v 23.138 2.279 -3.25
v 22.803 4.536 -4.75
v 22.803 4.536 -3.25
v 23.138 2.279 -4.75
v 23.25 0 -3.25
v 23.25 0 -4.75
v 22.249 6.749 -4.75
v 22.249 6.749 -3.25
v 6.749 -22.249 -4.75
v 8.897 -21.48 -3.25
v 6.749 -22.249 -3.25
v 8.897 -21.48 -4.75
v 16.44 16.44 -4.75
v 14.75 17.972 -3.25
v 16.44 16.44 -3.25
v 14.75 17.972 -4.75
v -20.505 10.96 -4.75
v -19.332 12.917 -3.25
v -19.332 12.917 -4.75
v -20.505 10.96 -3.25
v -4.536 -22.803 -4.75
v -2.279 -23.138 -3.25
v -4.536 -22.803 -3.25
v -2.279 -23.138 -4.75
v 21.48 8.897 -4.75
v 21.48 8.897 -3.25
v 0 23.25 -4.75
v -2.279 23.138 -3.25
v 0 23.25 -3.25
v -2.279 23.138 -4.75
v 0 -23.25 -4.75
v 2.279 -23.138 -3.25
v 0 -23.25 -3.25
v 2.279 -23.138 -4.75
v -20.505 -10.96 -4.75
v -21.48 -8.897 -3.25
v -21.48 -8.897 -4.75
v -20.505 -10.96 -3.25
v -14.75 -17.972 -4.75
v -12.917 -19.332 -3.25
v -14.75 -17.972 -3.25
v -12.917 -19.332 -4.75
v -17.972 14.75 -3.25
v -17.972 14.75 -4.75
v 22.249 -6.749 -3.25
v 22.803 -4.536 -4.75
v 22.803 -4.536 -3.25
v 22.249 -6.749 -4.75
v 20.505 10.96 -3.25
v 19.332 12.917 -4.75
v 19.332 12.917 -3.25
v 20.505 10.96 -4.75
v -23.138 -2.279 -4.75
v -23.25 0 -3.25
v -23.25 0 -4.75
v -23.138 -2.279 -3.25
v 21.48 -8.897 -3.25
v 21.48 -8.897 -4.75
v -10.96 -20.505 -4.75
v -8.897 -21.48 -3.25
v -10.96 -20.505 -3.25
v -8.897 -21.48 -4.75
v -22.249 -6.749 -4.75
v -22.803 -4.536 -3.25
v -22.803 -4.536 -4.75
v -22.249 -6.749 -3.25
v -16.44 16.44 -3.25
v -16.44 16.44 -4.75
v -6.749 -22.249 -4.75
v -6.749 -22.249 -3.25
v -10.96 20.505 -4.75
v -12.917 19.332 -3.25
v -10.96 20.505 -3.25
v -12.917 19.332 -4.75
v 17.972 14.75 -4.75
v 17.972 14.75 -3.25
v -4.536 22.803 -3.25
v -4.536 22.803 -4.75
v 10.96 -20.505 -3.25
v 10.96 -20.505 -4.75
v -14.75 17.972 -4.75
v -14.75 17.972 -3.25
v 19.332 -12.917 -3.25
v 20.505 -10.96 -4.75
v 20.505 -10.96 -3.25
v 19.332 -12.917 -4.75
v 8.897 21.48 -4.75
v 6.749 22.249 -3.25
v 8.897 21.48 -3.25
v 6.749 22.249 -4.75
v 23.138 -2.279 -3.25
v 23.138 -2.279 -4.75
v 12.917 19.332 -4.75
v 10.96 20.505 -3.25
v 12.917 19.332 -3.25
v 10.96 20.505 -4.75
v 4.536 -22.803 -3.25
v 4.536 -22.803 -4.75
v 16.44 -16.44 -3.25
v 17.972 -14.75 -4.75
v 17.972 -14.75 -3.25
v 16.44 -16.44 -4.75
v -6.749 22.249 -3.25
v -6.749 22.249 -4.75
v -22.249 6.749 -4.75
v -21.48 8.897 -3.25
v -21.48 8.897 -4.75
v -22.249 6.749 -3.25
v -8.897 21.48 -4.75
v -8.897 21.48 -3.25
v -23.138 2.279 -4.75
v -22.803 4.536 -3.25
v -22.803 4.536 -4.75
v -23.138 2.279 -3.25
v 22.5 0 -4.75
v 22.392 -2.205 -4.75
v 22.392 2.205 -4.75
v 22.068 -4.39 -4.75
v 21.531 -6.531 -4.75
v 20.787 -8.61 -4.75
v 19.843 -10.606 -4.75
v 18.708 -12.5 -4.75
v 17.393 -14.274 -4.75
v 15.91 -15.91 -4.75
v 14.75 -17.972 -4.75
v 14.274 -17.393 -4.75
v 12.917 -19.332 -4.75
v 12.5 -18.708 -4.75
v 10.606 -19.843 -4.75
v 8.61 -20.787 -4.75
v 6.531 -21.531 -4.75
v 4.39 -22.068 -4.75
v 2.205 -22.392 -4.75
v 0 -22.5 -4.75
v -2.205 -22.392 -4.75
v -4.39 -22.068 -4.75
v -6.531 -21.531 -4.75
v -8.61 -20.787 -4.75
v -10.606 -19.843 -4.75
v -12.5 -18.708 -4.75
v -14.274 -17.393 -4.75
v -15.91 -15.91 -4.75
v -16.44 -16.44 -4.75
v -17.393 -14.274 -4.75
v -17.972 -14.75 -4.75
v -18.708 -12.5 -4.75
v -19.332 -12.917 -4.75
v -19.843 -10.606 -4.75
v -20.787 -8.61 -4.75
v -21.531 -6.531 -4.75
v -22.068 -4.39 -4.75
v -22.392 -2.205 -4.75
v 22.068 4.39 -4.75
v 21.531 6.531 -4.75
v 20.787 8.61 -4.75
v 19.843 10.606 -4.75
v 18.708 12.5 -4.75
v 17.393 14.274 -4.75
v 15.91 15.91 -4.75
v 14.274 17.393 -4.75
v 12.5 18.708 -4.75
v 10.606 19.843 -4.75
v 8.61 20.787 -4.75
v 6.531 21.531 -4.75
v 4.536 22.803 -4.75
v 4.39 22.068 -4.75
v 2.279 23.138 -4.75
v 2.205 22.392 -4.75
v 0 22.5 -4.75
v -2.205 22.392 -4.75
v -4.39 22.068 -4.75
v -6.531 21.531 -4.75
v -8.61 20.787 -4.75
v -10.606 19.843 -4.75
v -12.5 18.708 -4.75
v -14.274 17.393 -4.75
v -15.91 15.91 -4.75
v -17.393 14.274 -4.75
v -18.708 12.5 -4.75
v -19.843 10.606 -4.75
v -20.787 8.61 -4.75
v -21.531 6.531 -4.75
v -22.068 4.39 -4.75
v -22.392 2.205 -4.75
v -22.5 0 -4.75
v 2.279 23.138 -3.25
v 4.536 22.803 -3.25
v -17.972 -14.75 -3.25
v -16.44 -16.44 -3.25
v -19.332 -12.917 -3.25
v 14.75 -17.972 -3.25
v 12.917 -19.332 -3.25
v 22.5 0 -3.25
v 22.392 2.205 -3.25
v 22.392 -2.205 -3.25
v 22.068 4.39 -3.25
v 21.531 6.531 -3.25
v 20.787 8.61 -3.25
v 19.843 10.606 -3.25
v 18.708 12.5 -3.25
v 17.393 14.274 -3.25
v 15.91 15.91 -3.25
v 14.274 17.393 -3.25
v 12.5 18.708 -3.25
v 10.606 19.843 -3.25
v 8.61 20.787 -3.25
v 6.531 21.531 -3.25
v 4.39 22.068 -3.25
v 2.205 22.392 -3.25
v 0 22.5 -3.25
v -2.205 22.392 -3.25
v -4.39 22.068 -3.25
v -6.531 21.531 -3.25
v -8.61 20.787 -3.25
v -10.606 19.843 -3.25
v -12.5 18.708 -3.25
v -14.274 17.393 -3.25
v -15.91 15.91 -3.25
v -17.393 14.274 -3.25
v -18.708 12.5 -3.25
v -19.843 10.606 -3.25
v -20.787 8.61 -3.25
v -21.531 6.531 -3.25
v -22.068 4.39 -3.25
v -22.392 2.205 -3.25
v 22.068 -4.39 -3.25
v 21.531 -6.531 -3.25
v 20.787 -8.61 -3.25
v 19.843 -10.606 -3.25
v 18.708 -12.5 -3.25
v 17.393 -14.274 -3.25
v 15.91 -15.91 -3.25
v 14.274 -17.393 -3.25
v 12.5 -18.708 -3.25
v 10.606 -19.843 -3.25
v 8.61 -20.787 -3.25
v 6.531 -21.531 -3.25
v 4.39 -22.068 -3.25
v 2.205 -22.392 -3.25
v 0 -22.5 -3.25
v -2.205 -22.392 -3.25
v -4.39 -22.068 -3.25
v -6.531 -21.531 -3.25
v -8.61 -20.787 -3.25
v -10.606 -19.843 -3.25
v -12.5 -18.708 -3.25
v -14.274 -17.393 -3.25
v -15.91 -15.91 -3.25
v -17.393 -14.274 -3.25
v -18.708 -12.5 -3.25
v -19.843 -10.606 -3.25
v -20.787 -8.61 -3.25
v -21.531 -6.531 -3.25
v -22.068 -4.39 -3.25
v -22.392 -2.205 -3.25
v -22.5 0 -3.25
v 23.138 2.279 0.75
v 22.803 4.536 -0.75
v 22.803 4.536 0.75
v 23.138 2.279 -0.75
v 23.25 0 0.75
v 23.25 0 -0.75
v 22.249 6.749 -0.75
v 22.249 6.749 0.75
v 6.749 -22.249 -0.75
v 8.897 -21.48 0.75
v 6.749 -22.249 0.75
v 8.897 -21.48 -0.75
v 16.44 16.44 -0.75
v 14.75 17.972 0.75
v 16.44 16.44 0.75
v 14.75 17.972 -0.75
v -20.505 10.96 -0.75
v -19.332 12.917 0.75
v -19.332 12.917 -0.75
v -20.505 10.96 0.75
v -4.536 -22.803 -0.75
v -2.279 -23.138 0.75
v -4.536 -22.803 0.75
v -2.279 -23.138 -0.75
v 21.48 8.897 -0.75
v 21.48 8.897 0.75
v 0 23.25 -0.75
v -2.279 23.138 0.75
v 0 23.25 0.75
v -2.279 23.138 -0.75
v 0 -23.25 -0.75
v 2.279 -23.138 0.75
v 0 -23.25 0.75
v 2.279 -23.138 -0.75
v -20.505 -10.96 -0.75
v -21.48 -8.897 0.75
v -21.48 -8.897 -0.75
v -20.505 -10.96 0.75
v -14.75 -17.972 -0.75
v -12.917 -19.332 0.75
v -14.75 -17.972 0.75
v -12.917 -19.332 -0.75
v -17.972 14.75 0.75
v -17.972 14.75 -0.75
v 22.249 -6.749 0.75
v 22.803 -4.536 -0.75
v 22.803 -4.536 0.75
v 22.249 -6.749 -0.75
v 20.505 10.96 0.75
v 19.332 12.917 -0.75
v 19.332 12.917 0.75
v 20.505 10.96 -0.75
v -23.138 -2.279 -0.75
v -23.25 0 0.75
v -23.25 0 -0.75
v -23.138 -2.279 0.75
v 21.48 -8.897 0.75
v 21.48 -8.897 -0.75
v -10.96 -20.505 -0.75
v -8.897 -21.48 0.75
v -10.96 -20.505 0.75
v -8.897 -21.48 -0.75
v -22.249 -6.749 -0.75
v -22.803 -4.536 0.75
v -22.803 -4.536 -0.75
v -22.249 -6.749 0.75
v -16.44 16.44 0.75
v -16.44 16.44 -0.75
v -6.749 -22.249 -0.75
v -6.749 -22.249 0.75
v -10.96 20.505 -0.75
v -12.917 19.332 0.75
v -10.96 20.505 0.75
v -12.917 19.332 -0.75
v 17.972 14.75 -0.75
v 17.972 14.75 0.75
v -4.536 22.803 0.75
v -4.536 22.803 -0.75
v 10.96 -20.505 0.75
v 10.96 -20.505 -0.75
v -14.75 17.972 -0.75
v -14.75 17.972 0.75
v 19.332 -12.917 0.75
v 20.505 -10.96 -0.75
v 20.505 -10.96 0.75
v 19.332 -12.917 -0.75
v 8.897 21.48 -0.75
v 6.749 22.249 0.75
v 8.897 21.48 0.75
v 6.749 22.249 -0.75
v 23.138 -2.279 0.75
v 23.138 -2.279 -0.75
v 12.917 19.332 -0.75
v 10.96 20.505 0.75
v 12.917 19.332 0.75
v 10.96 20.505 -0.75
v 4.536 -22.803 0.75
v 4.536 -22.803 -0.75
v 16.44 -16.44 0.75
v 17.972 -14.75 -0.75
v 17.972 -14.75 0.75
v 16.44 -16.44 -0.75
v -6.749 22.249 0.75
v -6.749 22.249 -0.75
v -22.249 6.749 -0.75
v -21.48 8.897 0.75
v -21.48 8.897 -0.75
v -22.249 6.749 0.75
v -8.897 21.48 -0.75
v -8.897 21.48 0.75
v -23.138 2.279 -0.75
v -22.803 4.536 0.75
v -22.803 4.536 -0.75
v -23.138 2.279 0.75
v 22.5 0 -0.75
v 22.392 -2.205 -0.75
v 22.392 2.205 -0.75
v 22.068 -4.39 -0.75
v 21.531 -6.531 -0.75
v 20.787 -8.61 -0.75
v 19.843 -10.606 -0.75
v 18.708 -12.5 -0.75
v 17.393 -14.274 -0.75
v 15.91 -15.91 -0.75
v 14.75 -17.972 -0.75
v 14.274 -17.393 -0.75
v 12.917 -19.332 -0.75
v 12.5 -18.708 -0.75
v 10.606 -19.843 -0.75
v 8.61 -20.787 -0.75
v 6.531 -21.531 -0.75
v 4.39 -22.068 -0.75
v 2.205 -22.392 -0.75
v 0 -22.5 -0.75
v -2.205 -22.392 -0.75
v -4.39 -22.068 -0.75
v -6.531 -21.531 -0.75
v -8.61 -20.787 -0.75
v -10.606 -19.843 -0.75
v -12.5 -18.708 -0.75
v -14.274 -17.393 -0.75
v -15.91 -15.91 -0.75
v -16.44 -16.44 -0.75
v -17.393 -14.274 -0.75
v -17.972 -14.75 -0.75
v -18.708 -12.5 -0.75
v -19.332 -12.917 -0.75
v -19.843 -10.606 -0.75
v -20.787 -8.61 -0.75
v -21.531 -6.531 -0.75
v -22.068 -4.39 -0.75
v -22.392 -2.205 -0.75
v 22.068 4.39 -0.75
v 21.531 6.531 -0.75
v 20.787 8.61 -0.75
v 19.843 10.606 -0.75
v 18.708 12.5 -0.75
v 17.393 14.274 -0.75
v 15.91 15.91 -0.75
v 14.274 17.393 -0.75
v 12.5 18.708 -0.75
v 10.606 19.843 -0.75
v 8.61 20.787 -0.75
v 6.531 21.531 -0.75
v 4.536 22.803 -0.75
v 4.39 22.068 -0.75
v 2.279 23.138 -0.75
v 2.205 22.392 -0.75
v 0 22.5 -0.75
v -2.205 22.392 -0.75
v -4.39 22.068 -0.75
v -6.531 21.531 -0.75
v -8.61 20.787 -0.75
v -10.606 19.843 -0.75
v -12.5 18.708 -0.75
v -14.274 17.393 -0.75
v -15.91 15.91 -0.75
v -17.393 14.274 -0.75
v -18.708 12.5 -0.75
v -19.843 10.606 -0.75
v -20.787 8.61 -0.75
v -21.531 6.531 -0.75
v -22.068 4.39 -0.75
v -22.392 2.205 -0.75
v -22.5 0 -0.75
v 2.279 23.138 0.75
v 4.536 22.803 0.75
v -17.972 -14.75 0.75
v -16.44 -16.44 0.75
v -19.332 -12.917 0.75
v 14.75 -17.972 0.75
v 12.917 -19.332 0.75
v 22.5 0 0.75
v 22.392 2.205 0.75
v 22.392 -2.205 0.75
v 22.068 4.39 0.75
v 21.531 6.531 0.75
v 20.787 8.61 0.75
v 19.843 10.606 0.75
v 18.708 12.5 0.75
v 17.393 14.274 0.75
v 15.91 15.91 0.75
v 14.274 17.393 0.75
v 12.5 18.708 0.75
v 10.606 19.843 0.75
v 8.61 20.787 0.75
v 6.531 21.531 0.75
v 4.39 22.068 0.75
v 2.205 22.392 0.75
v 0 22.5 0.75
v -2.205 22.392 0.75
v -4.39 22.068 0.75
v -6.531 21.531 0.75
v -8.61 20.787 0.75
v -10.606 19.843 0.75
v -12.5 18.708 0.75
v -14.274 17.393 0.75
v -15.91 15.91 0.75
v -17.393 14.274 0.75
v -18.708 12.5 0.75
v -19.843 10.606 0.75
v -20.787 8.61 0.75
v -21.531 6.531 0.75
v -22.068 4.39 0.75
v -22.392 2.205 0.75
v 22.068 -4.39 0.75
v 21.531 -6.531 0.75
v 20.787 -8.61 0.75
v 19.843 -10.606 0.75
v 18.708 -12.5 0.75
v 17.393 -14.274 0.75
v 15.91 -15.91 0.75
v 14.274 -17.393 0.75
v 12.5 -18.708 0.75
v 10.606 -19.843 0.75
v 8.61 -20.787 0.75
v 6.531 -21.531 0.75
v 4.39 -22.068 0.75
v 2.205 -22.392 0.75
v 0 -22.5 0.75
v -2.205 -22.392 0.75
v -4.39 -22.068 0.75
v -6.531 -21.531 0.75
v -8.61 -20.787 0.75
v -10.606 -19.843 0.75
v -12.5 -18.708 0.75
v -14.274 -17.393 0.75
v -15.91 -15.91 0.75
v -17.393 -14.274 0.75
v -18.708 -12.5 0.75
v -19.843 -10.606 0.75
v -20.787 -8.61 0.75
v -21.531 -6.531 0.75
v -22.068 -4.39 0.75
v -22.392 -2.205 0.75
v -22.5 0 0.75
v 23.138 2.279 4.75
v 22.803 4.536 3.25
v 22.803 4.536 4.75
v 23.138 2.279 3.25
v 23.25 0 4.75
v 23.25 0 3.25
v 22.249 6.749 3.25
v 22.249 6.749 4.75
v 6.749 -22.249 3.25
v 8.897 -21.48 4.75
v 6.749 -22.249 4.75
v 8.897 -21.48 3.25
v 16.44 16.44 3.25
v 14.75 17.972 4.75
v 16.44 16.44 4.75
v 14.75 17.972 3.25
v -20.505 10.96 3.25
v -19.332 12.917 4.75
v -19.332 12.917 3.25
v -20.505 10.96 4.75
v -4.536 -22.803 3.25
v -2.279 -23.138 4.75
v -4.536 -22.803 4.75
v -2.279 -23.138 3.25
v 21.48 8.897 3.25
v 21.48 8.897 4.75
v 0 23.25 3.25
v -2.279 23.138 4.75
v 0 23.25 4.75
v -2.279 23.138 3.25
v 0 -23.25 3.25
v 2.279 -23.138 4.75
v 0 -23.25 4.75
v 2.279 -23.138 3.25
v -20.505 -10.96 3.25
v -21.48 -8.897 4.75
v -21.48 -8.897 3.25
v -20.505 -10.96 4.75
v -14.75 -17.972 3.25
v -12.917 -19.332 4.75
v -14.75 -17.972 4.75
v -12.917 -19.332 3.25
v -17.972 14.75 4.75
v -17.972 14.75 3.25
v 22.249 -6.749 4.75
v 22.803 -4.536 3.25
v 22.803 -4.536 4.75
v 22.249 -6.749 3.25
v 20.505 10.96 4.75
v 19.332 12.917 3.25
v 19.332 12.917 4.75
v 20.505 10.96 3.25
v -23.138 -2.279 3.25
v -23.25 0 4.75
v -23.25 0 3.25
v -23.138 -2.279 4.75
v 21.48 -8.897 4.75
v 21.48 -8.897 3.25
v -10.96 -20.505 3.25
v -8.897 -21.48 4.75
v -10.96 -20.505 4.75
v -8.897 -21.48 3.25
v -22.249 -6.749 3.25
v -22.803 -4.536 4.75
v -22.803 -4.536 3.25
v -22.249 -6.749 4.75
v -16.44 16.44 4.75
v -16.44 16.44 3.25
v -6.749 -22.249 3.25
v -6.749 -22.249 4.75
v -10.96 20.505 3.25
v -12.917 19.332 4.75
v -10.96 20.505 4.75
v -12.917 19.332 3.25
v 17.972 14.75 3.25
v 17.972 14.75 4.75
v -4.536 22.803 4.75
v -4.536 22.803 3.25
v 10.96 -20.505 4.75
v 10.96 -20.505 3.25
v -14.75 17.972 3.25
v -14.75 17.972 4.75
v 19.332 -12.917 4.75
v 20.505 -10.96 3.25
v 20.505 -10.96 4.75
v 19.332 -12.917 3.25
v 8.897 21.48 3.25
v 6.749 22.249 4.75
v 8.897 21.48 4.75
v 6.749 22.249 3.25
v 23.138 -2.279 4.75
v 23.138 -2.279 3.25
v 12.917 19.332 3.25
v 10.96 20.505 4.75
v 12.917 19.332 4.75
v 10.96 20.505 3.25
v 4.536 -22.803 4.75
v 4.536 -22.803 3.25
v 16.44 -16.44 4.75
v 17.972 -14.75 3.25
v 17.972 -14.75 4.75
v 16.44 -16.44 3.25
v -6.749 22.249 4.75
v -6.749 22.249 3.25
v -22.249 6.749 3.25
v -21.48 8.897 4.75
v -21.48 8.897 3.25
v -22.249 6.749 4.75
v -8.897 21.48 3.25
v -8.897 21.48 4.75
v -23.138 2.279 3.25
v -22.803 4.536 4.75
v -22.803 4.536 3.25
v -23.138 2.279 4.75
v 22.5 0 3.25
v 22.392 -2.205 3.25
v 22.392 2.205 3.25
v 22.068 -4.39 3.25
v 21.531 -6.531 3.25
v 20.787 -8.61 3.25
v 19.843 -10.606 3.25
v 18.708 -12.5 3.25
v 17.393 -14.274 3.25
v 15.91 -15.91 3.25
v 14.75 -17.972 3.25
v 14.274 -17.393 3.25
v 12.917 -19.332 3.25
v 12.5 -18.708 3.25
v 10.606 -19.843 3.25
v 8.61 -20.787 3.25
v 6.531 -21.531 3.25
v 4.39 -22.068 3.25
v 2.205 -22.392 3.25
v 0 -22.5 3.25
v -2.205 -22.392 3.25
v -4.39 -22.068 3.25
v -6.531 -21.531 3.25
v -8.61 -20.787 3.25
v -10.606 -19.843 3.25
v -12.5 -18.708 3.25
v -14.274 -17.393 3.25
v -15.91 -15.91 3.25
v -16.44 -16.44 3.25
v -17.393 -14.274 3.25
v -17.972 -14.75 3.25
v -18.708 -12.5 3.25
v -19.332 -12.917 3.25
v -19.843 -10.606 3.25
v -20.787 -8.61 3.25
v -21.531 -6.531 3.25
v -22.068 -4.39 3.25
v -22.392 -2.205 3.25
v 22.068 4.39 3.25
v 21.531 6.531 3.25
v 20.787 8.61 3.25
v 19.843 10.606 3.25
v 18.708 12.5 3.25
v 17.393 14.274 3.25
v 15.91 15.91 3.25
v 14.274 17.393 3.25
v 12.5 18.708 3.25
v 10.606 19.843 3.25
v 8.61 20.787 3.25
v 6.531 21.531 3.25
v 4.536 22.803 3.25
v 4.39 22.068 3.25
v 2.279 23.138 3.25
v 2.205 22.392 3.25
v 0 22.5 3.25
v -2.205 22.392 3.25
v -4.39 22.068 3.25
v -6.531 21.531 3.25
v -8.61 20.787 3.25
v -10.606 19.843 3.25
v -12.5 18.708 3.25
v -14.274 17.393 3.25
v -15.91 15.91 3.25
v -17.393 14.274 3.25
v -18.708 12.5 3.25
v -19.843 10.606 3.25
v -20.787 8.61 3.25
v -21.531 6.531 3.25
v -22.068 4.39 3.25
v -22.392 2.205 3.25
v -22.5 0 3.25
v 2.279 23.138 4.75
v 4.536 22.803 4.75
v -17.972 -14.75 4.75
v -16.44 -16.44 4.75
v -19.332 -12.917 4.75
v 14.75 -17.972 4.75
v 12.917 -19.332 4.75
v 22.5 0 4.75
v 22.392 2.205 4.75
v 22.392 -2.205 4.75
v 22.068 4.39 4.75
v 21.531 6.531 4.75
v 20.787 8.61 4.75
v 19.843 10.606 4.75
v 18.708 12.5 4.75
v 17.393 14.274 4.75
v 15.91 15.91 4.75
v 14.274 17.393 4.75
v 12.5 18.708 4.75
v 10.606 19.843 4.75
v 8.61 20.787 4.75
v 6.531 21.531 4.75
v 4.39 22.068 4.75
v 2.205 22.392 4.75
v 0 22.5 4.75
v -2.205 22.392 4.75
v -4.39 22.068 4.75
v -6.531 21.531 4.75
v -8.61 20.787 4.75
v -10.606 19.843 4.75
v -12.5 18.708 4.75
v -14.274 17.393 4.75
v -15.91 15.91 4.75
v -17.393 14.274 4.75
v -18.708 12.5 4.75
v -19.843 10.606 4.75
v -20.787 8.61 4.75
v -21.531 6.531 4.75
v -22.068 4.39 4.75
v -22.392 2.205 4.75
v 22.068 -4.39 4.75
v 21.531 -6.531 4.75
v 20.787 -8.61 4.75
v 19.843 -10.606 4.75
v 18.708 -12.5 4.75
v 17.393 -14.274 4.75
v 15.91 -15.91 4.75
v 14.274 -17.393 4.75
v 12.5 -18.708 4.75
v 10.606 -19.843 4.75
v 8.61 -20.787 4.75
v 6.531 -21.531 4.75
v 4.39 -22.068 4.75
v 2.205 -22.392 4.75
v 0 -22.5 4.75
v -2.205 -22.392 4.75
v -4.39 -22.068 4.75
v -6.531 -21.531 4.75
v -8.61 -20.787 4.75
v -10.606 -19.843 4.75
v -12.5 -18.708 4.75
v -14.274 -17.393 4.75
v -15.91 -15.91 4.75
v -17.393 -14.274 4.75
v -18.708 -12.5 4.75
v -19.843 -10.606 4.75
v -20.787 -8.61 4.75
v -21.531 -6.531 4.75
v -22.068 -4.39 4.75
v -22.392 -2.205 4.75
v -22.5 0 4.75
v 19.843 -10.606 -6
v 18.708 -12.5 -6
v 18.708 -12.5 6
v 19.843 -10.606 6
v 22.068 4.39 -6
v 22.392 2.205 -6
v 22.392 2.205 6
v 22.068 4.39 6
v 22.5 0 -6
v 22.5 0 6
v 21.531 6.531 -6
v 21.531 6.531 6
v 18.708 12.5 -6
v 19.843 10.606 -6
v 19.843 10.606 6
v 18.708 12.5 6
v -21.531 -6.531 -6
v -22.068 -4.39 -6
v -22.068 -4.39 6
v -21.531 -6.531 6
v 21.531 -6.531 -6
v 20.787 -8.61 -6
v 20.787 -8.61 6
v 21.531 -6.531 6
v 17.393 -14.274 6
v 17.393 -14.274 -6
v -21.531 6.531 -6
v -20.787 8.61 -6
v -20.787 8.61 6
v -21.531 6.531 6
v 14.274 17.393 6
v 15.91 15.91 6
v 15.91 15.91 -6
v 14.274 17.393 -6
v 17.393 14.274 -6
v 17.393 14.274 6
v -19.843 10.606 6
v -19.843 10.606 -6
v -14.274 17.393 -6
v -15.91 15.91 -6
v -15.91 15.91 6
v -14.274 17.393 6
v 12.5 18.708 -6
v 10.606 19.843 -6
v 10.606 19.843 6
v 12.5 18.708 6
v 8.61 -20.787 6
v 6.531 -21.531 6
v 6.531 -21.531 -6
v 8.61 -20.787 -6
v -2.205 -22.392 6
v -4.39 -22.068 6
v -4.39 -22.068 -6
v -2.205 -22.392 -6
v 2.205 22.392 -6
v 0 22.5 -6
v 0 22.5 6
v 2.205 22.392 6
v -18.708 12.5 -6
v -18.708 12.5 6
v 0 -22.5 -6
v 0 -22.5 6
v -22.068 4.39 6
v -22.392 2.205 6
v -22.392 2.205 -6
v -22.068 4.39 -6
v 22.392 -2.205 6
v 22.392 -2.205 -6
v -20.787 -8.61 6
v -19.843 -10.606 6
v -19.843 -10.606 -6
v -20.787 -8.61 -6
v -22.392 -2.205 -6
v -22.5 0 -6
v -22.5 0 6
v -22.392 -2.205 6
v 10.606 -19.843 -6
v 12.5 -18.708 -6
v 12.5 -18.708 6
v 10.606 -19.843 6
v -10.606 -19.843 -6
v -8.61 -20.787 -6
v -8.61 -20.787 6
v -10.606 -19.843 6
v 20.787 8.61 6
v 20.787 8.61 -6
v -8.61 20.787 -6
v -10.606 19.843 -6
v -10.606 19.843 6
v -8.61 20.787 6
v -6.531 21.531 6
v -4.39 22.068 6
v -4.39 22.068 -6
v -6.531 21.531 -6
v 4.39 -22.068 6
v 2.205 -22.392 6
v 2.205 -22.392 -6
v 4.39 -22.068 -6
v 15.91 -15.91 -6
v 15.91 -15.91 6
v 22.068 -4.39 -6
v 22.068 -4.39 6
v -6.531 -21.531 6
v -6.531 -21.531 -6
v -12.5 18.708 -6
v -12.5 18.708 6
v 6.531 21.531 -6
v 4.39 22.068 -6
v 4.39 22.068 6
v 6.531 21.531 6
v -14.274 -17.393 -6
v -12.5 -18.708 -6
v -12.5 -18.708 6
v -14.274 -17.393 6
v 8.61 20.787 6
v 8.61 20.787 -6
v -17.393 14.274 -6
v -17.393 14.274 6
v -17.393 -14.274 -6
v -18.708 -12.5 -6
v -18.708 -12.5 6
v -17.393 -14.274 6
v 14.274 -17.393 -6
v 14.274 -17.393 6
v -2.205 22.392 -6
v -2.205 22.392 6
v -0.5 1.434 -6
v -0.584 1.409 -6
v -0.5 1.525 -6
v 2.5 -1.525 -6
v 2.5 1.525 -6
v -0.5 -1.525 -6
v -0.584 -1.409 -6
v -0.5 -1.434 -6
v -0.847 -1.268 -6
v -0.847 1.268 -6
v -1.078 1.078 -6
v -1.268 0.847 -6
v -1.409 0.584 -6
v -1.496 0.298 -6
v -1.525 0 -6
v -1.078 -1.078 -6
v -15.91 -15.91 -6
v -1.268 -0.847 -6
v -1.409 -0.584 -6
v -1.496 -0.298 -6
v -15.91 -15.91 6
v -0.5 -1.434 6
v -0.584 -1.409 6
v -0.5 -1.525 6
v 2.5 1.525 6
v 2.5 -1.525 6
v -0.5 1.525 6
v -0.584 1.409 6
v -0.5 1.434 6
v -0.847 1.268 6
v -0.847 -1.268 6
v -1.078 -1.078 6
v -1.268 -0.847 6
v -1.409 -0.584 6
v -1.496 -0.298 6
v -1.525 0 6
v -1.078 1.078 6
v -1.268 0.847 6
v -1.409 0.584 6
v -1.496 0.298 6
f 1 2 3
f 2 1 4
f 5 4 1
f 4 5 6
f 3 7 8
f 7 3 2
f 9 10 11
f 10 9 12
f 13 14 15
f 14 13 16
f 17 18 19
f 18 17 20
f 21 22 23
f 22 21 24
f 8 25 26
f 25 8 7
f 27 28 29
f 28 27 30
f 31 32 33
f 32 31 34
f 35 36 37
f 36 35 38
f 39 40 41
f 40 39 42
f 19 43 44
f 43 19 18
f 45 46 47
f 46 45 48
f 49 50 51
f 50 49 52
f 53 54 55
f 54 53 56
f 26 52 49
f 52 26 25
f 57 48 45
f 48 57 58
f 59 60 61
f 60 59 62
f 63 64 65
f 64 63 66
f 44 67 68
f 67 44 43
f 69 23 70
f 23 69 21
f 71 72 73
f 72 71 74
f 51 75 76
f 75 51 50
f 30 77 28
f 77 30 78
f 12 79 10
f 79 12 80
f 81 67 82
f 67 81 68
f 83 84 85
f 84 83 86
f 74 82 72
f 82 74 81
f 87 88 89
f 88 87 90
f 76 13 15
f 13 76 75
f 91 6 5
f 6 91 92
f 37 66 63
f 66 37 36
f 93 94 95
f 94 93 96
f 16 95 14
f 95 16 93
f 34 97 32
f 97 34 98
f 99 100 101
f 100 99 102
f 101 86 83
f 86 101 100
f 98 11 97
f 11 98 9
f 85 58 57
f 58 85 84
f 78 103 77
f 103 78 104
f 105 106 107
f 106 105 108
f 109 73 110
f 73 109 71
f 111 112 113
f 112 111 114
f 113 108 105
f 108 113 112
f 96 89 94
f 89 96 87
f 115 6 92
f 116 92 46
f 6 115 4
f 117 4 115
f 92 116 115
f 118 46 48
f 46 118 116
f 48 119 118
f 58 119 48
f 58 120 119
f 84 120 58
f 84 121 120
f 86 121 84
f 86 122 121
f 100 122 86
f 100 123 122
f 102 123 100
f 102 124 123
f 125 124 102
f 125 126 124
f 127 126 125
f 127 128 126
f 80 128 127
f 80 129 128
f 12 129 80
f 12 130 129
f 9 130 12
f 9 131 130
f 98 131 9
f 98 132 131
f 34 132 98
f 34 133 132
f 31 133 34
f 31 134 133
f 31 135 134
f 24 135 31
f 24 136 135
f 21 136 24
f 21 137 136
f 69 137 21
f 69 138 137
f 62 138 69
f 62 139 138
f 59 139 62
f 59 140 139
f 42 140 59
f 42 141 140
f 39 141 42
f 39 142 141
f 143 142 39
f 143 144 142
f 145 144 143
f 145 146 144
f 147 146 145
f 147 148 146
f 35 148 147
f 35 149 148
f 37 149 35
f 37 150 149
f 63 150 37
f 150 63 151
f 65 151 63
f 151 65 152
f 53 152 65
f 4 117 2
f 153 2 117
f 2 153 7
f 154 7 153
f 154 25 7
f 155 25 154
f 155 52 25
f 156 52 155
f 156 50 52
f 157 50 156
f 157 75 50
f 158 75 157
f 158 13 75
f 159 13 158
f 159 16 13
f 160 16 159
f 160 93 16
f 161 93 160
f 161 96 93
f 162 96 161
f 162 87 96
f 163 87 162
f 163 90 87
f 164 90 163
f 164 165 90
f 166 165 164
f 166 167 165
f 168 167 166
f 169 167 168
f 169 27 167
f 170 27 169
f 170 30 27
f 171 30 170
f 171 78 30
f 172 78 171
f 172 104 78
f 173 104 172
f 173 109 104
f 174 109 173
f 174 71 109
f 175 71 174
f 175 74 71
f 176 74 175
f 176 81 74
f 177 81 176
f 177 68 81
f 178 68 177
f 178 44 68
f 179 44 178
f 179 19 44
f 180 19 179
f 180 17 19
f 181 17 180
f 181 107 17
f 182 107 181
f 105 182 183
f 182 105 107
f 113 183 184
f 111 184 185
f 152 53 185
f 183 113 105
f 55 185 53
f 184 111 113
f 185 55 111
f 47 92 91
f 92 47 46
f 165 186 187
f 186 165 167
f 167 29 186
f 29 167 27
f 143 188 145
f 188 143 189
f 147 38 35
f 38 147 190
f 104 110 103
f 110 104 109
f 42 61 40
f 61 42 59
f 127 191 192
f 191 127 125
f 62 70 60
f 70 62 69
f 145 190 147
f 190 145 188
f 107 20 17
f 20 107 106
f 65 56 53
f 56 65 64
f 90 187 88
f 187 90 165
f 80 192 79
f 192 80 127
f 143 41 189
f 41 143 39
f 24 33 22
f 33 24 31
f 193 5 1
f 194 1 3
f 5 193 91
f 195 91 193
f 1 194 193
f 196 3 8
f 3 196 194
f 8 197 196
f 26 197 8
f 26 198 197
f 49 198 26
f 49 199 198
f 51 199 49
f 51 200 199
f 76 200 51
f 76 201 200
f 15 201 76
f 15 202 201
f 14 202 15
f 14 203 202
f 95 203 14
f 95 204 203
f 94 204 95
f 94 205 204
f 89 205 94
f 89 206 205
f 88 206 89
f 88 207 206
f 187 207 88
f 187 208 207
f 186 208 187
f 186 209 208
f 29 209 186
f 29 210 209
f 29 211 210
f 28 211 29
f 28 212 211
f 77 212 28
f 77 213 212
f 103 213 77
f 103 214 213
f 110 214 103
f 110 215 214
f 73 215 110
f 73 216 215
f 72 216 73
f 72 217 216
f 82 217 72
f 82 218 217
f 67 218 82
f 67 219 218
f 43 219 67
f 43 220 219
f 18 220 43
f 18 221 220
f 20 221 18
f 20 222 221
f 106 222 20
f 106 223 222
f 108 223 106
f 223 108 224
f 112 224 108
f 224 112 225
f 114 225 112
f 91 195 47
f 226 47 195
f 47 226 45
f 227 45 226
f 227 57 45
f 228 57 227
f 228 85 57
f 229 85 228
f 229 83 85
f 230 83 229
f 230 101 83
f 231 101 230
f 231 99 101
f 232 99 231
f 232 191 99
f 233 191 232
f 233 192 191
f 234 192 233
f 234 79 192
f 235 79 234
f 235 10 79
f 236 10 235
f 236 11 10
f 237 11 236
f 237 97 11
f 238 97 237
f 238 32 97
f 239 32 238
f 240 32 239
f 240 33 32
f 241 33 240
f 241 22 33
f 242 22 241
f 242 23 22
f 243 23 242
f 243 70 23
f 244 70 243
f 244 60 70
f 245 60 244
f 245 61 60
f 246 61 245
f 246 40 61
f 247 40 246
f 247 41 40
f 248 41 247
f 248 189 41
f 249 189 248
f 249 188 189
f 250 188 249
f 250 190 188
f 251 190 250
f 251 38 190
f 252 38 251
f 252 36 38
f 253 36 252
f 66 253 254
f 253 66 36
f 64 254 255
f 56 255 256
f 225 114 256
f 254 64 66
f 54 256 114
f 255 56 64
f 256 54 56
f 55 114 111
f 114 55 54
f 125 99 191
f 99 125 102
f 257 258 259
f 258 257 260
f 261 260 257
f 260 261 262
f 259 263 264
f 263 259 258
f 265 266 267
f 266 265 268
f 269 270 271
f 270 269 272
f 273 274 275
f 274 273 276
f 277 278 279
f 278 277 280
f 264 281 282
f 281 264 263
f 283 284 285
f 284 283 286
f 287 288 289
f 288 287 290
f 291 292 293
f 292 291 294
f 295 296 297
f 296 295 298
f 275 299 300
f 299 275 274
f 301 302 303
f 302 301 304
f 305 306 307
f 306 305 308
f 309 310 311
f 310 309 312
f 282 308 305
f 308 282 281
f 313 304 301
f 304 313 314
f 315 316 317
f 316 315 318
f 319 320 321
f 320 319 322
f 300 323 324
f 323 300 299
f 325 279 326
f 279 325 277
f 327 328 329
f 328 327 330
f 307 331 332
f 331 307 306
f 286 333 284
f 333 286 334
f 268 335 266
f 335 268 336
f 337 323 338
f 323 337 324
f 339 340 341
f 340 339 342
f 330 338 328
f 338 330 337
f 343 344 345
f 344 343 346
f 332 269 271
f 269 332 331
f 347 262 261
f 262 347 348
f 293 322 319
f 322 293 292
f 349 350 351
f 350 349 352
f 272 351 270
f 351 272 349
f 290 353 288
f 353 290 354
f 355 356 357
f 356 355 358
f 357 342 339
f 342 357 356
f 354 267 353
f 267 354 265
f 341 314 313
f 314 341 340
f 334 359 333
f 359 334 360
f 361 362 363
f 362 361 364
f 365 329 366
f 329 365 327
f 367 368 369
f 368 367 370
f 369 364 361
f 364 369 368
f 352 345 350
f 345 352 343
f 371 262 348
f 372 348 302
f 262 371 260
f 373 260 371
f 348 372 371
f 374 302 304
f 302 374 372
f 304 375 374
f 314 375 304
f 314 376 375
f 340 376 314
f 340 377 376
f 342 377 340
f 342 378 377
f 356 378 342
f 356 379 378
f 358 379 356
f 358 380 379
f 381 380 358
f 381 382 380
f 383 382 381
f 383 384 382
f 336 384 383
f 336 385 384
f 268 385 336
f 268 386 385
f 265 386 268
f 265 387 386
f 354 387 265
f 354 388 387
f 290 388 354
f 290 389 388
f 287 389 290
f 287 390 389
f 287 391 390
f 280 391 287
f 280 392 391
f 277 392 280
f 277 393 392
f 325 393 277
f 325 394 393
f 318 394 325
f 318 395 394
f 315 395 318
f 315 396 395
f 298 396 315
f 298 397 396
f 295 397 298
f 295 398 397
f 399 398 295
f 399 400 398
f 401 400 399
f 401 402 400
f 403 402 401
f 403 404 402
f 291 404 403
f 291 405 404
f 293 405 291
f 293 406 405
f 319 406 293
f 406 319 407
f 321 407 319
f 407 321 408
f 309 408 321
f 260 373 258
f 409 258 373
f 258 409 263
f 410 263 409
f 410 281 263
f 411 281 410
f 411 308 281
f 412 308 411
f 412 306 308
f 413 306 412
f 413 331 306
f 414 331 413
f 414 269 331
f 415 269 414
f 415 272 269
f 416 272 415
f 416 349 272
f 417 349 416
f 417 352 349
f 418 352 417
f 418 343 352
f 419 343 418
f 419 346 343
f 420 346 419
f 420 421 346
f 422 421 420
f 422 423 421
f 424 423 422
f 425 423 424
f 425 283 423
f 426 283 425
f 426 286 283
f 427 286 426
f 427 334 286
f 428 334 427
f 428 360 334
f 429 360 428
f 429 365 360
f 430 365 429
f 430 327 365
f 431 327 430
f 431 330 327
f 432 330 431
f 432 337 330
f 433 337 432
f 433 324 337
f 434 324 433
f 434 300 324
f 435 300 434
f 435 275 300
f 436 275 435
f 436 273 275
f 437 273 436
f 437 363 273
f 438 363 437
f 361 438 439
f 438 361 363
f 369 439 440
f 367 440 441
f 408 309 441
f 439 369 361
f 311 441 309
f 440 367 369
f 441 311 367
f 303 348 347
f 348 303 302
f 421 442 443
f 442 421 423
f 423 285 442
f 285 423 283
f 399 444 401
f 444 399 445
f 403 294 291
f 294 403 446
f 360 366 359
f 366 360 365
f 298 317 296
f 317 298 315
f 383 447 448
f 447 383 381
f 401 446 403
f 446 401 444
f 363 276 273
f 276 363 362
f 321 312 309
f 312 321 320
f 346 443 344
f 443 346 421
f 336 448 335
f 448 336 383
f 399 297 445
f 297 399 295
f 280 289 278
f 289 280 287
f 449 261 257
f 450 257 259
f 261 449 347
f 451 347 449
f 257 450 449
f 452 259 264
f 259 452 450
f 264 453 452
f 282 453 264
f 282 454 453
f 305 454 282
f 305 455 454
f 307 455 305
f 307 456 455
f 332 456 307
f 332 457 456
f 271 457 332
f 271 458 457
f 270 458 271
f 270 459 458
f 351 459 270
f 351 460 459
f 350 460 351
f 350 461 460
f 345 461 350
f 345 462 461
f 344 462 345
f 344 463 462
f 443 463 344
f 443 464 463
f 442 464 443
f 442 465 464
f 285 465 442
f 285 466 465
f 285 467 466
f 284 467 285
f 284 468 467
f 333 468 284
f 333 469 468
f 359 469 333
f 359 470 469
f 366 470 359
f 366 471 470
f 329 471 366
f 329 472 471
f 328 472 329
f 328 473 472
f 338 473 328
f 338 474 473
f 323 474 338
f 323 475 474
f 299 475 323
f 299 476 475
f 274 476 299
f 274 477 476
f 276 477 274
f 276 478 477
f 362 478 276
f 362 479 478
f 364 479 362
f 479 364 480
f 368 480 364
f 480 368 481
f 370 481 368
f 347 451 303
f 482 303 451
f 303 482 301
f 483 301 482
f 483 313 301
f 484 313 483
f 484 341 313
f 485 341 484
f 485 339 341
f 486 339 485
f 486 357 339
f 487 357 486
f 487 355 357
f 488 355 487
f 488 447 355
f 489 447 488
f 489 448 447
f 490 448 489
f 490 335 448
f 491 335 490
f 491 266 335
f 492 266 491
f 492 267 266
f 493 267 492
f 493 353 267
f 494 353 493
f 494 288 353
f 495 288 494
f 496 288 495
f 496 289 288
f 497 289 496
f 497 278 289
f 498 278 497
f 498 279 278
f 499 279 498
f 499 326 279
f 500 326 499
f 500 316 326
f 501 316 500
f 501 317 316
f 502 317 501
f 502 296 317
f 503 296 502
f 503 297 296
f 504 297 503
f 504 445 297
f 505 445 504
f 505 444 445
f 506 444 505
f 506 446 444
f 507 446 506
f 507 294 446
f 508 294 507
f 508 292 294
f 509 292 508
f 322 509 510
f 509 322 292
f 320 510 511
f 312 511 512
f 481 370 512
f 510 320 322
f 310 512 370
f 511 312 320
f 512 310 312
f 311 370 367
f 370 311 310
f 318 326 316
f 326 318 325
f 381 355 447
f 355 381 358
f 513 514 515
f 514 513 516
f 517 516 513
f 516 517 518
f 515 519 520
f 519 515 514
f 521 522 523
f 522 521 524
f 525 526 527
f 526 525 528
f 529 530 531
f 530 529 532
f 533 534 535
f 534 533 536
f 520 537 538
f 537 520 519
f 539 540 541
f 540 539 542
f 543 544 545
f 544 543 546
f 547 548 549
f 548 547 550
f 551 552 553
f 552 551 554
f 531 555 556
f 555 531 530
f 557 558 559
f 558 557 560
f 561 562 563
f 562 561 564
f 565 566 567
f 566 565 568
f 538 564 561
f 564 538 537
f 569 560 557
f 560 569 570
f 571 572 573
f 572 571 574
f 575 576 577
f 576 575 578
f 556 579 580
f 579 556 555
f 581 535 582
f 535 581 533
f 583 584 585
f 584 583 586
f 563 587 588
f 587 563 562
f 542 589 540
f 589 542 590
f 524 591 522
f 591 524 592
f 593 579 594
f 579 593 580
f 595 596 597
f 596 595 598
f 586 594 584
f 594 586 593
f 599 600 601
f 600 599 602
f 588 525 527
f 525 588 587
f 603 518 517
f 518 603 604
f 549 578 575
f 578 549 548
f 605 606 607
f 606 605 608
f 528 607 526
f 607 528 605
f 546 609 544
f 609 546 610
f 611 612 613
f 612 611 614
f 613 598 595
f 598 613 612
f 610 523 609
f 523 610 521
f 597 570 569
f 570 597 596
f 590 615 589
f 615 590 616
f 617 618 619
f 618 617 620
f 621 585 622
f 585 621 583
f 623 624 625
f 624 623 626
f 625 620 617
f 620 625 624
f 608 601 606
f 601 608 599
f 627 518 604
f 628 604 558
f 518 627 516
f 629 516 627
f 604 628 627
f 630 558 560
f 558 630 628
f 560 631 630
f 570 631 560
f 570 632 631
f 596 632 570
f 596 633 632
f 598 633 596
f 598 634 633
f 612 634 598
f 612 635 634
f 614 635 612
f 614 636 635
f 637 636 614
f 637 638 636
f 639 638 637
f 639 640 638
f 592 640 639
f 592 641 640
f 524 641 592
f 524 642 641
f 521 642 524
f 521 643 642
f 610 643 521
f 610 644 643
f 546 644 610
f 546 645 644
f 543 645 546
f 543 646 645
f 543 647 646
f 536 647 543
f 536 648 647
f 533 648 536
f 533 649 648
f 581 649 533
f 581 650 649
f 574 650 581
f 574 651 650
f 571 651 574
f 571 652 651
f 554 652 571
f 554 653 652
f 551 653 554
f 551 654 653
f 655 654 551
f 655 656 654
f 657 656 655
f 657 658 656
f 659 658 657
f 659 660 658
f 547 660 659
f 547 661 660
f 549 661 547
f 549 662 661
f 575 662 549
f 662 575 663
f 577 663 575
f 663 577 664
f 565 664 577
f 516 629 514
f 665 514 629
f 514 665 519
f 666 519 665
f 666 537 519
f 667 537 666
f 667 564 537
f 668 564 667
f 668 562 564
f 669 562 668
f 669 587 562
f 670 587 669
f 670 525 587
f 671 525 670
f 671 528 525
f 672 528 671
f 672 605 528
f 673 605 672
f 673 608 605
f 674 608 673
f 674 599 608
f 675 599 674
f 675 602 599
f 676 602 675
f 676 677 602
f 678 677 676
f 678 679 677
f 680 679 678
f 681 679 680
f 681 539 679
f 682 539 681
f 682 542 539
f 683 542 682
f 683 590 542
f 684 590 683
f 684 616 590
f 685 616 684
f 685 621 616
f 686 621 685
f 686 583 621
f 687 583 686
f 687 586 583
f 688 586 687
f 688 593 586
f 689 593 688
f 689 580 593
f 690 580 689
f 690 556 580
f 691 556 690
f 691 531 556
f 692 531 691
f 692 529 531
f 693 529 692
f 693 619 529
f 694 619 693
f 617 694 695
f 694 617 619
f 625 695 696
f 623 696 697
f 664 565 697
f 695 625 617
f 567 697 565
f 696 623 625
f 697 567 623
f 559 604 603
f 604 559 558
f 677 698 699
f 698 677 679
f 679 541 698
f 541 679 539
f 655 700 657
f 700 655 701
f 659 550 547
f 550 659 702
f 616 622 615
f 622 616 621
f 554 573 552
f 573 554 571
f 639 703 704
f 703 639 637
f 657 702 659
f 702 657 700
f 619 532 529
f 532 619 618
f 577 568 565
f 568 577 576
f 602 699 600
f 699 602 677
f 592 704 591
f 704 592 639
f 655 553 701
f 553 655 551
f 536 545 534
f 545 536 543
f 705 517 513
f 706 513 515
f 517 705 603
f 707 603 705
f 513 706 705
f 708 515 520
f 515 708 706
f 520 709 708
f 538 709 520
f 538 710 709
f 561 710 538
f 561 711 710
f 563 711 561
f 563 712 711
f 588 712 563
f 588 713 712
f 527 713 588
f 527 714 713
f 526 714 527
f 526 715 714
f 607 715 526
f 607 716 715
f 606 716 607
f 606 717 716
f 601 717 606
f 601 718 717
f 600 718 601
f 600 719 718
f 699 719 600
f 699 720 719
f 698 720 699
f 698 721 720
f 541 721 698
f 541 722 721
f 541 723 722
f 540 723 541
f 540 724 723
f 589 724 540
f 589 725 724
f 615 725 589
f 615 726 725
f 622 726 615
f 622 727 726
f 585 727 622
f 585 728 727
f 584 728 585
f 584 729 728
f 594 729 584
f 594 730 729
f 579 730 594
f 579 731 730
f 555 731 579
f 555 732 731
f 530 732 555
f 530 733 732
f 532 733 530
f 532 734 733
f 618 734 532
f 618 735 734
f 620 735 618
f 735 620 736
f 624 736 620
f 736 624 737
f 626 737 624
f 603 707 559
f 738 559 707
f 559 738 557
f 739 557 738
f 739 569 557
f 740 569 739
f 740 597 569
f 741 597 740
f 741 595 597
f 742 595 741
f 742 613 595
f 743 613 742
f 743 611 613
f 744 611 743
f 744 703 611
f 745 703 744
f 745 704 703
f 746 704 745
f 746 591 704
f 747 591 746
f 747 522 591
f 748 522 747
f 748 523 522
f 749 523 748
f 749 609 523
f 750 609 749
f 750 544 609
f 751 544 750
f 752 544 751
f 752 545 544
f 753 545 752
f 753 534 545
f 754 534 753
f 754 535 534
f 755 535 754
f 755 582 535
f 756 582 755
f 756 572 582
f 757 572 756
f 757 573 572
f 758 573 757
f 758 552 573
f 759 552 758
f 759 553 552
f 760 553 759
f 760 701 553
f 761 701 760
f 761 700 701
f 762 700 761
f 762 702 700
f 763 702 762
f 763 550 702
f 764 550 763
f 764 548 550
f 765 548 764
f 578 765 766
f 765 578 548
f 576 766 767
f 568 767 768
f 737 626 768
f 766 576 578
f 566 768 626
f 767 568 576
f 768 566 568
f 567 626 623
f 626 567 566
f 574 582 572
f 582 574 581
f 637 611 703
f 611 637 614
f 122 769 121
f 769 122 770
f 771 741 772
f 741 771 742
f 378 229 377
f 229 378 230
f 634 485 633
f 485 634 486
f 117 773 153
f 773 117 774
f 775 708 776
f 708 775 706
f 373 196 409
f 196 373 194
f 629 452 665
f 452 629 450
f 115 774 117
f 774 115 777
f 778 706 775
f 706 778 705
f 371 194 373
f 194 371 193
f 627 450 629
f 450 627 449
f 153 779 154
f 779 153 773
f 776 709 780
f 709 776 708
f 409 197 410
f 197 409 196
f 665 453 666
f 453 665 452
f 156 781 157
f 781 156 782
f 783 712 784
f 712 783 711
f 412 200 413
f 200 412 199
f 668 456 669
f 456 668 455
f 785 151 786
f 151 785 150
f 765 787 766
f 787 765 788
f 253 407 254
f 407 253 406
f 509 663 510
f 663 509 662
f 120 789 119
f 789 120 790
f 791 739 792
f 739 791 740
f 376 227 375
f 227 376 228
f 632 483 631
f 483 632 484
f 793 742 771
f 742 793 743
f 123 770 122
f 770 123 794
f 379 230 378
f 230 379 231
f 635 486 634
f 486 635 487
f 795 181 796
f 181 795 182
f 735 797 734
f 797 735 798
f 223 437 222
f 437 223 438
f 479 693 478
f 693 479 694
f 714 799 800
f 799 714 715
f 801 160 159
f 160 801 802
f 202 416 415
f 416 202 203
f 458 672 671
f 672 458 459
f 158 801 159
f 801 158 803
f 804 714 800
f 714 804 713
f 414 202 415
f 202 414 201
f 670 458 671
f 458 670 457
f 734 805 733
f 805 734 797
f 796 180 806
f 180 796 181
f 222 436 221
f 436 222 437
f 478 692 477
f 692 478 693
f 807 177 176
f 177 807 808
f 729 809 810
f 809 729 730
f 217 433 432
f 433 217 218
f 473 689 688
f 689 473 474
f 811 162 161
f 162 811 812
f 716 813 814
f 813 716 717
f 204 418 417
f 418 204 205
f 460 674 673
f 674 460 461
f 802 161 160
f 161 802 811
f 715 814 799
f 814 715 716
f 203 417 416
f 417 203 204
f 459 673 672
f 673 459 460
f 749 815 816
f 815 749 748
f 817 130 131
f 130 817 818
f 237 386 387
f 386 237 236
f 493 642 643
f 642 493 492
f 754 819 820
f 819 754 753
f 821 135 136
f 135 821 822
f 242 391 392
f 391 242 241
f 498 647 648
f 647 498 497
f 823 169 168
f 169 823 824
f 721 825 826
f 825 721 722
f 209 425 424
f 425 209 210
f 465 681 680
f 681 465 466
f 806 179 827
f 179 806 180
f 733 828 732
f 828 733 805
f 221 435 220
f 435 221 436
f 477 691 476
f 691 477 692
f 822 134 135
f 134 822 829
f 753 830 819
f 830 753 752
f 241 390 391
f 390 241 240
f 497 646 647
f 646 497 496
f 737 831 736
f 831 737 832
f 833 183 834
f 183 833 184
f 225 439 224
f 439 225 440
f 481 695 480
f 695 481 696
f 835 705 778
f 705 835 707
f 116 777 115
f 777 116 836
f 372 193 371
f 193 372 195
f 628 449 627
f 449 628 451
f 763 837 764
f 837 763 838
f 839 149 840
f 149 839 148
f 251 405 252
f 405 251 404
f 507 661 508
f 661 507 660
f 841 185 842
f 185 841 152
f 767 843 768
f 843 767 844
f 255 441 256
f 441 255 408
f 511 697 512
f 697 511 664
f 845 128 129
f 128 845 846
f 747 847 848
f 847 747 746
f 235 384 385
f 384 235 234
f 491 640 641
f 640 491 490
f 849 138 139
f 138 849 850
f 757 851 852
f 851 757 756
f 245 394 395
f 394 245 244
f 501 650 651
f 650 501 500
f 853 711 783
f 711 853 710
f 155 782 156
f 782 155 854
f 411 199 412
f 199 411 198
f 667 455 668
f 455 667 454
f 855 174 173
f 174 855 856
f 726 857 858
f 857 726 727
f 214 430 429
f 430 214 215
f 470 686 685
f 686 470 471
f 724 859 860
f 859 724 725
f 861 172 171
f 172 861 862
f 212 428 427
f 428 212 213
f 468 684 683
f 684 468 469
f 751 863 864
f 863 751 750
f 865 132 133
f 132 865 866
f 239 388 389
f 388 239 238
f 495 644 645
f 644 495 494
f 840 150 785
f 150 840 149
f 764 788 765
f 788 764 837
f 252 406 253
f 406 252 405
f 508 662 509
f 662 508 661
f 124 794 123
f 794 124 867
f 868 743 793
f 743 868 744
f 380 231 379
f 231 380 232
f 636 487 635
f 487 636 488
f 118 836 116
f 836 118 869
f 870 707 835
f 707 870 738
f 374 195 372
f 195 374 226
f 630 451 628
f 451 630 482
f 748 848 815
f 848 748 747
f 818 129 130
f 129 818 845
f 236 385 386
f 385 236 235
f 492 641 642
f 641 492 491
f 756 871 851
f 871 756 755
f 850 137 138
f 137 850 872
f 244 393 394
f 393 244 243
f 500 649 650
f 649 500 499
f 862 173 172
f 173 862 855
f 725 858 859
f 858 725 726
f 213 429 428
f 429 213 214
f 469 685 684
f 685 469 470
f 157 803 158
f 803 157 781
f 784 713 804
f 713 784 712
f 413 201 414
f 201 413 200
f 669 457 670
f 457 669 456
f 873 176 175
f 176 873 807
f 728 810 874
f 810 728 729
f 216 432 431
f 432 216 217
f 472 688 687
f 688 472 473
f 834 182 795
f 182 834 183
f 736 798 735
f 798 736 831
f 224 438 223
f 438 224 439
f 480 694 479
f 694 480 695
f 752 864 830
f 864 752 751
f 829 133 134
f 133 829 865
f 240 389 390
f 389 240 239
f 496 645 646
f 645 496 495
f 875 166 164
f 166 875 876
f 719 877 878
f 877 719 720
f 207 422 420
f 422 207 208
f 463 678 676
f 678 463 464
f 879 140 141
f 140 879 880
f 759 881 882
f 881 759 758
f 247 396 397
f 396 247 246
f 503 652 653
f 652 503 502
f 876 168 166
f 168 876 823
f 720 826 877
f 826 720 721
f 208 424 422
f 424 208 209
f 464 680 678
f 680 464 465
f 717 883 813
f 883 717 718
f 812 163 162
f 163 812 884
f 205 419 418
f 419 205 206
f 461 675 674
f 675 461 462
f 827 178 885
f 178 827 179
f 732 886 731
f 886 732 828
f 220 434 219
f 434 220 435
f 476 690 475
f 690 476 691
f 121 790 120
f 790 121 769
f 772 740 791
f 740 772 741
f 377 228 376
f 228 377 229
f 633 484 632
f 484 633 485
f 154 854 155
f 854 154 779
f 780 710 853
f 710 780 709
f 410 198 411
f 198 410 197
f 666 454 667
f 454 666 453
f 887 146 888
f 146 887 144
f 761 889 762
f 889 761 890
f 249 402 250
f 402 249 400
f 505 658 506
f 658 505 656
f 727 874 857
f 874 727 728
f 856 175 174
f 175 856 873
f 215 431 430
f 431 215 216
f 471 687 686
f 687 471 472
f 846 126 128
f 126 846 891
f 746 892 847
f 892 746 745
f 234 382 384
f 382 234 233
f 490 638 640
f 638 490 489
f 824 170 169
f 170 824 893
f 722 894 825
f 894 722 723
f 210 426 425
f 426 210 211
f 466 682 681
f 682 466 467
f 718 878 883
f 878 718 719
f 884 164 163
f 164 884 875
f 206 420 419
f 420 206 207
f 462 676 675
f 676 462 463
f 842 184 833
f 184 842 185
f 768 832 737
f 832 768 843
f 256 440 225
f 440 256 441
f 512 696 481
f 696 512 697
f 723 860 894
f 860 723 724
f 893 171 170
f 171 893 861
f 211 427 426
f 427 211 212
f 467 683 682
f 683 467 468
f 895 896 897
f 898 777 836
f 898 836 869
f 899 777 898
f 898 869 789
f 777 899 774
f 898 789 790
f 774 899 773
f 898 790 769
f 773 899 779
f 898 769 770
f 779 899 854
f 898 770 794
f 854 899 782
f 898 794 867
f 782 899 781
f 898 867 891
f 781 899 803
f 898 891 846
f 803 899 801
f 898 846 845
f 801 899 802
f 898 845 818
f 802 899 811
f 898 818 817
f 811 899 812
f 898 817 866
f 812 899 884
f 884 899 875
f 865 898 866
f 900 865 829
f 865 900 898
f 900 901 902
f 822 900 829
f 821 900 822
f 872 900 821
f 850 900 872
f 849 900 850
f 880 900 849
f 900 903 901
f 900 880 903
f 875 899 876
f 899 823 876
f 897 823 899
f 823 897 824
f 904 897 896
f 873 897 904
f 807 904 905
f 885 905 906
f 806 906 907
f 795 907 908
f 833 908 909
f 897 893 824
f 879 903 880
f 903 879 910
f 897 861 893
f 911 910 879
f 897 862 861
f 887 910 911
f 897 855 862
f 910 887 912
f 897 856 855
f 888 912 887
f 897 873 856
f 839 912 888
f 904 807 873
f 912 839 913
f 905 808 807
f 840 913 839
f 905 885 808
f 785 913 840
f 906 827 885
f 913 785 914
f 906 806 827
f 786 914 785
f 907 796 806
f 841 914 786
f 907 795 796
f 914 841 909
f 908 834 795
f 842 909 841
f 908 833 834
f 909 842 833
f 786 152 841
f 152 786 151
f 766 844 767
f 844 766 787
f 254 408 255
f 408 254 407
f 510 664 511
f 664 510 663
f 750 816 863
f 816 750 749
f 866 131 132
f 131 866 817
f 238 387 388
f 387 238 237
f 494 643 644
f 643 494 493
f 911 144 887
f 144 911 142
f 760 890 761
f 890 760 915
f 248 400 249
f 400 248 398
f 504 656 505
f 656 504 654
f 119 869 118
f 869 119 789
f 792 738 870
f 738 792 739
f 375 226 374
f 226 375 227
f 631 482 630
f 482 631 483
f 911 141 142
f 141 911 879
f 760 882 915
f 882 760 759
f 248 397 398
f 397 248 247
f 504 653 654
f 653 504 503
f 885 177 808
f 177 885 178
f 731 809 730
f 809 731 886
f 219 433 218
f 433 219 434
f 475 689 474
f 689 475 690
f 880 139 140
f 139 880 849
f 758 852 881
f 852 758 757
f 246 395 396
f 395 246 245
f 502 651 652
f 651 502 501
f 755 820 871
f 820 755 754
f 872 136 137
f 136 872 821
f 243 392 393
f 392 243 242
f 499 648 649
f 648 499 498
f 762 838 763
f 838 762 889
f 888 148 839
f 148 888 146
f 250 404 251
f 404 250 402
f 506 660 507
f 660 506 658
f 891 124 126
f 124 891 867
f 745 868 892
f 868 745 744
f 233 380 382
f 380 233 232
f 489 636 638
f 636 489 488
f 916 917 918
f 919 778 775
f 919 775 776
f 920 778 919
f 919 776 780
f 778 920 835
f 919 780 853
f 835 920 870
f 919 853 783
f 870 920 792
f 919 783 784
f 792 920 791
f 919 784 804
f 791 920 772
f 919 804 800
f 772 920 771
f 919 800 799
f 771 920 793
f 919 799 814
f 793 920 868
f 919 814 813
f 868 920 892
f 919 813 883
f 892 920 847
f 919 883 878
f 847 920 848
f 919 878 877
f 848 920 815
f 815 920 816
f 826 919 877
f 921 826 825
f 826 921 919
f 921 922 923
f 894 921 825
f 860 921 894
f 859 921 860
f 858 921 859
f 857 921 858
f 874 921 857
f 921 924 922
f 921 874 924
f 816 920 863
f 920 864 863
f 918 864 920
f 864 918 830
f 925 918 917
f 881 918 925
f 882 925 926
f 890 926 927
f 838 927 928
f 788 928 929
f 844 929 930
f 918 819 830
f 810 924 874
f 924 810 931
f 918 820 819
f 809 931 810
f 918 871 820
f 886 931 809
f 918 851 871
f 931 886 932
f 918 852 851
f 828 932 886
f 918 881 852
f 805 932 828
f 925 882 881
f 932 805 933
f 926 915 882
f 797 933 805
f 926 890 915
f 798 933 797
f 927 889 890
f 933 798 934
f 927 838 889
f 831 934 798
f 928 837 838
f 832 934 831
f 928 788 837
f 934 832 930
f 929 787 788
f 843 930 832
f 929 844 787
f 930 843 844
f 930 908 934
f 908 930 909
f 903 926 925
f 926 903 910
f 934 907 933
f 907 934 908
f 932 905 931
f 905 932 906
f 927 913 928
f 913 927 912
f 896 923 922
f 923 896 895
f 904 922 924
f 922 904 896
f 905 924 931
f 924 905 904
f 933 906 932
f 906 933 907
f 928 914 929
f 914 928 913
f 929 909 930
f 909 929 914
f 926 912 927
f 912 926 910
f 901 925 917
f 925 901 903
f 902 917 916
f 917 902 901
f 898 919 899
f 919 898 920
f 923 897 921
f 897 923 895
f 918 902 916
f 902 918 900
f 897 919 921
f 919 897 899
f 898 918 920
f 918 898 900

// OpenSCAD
// file: config.scad
// PenguinBot - Print Configuration & Shared Utilities
// Units: mm | Tolerance for 3D printed parts

// ===== Print Parameters =====
LAYER_HEIGHT = 0.12;  // Appearance parts
WALL_THICKNESS = 1.6; // 3 perimeters @ 0.4mm nozzle → 1.2mm, add safety margin
CLEARANCE = 0.15;     // Hole compensation for FDM
TIGHT_FIT = 0.05;     // Press-fit tolerance
SLIP_FIT = 0.25;      // Sliding fit tolerance

// ===== MG90S Servo Dimensions =====
SERVO_BODY_W = 22.8;
SERVO_BODY_H = 12.2;
SERVO_BODY_D = 29.5;
SERVO_FLANGE_W = 32.2;
SERVO_FLANGE_H = 2.0;
SERVO_MOUNT_HOLE_SPACING = 27.0;
SERVO_MOUNT_HOLE_D = 2.0 + CLEARANCE;
SERVO_SPLINE_D = 4.8;
SERVO_SPLINE_OFFSET = 10.0;  // Spline center from top edge

// ===== N20 Motor Dimensions =====
N20_BODY_D = 24.4;
N20_BODY_L = 13.0;
N20_GEARBOX_D = 24.4;
N20_GEARBOX_L = 12.0;
N20_SHAFT_D = 3.0;
N20_SHAFT_L = 12.0;
N20_MOUNT_HOLE_SPACING = 17.0;
N20_MOUNT_HOLE_D = 2.5;

// ===== AS5600 Encoder =====
AS5600_PCB_W = 16.0;
AS5600_PCB_H = 12.7;
AS5600_PCB_T = 1.6;
MAGNET_D = 6.0;
MAGNET_H = 2.0;

// ===== Display =====
TFT_DISPLAY_W = 31.5;
TFT_DISPLAY_H = 43.5;
TFT_DISPLAY_T = 2.5;
TFT_ACTIVE_W = 24.0;
TFT_ACTIVE_H = 32.0;
TFT_PCB_W = 36.0;
TFT_PCB_H = 52.0;

// ===== Battery 2S 1500mAh (typical) =====
BATTERY_W = 35.0;
BATTERY_H = 18.0;
BATTERY_D = 70.0;

// ===== General Dimensions =====
BODY_W = 60.0;
BODY_D = 45.0;
BODY_H = 55.0;
HEAD_DIAMETER = 55.0;
HEAD_H = 40.0;
LEG_UPPER_L = 28.0;
LEG_LOWER_L = 32.0;
WHEEL_DIAMETER = 45.0;
WHEEL_WIDTH = 12.0;
ROBOT_TOTAL_H = 155.0;

// M2 / M3 fastener clearances
M2_CLEAR = 2.2;
M2_TAP = 1.6;
M2_NUT_D = 4.5;
M2_NUT_H = 1.8;
M3_CLEAR = 3.3;
M3_TAP = 2.5;

// ===== Utility Modules =====
module servo_cutout() {
    // Main body
    translate([0, 0, -SERVO_BODY_D/2])
        cube([SERVO_BODY_W + SLIP_FIT, SERVO_BODY_H + SLIP_FIT, SERVO_BODY_D + 1], center=true);
    // Flange
    translate([0, 0, -SERVO_FLANGE_H/2])
        cube([SERVO_FLANGE_W + SLIP_FIT, SERVO_FLANGE_H + SLIP_FIT, SERVO_BODY_D], center=true);
    // Mounting holes
    for (x = [-1, 1])
        translate([x * SERVO_MOUNT_HOLE_SPACING/2, 0, -SERVO_BODY_D/2])
            cylinder(d=SERVO_MOUNT_HOLE_D, h=SERVO_BODY_D + 2, center=true, $fn=16);
}

module n20_cutout() {
    union() {
        // Motor body
        cylinder(d=N20_BODY_D + SLIP_FIT, h=N20_BODY_L + 1, center=true, $fn=32);
        // Gearbox
        translate([0, 0, N20_BODY_L/2 + N20_GEARBOX_L/2])
            cylinder(d=N20_GEARBOX_D + SLIP_FIT, h=N20_GEARBOX_L + 0.5, center=true, $fn=32);
        // Mount holes
        for (x = [-1, 1])
            translate([x * N20_MOUNT_HOLE_SPACING/2, 0, 0])
                cylinder(d=N20_MOUNT_HOLE_D + CLEARANCE, h=30, center=true, $fn=16);
    }
}

// counterbore for M2 flat head screw
module m2_counterbore(length=10) {
    union() {
        cylinder(d=M2_CLEAR, h=length, center=false, $fn=16);
        translate([0, 0, length - 2.5])
            cylinder(d=4.5, h=3, center=false, $fn=16);
    }
}

// Hex nut trap (horizontal)
module m2_nut_trap() {
    cylinder(d=M2_NUT_D + 0.15, h=M2_NUT_H + 0.1, $fn=6);
}
// main file
// PenguinBot - Wheel Hub (TPU)
// Flexible tire with D-cut shaft mount
include <config.scad>

module wheel_hub() {
    difference() {
        union() {
            // Tire cylinder
            cylinder(d=WHEEL_DIAMETER, h=WHEEL_WIDTH, center=true, $fn=64);

            // Tread pattern (raised rings)
            for (z = [-WHEEL_WIDTH/2 + 2 : 4 : WHEEL_WIDTH/2 - 2])
                translate([0, 0, z])
                    cylinder(d=WHEEL_DIAMETER + 1.5, h=1.5, center=true, $fn=64);

            // Hub reinforcement
            translate([0, 0, 0])
                cylinder(d=16, h=WHEEL_WIDTH, center=true, $fn=32);
        }

        // D-cut shaft hole
        translate([0, 0, 0])
            union() {
                cylinder(d=N20_SHAFT_D + TIGHT_FIT, h=WHEEL_WIDTH + 2, center=true, $fn=32);
                // Flat
                translate([N20_SHAFT_D/2 - 0.5, 0, 0])
                    cube([N20_SHAFT_D, N20_SHAFT_D + TIGHT_FIT, WHEEL_WIDTH + 2], center=true);
            }
    }
}

// ===== Wheel assembly (with motor representation) =====
module wheel_assembly() {
    // N20 motor body
    color("Silver") cylinder(d=N20_BODY_D, h=N20_BODY_L + N20_GEARBOX_L, center=true, $fn=32);

    // Shaft
    color("Silver")
        translate([0, 0, N20_BODY_L/2 + N20_GEARBOX_L])
            cylinder(d=N20_SHAFT_D, h=N20_SHAFT_L, $fn=24);

    // Wheel
    color("Black")
        translate([0, 0, N20_BODY_L/2 + N20_GEARBOX_L + N20_SHAFT_L/2])
            wheel_hub();
}

// Preview
wheel_hub();
